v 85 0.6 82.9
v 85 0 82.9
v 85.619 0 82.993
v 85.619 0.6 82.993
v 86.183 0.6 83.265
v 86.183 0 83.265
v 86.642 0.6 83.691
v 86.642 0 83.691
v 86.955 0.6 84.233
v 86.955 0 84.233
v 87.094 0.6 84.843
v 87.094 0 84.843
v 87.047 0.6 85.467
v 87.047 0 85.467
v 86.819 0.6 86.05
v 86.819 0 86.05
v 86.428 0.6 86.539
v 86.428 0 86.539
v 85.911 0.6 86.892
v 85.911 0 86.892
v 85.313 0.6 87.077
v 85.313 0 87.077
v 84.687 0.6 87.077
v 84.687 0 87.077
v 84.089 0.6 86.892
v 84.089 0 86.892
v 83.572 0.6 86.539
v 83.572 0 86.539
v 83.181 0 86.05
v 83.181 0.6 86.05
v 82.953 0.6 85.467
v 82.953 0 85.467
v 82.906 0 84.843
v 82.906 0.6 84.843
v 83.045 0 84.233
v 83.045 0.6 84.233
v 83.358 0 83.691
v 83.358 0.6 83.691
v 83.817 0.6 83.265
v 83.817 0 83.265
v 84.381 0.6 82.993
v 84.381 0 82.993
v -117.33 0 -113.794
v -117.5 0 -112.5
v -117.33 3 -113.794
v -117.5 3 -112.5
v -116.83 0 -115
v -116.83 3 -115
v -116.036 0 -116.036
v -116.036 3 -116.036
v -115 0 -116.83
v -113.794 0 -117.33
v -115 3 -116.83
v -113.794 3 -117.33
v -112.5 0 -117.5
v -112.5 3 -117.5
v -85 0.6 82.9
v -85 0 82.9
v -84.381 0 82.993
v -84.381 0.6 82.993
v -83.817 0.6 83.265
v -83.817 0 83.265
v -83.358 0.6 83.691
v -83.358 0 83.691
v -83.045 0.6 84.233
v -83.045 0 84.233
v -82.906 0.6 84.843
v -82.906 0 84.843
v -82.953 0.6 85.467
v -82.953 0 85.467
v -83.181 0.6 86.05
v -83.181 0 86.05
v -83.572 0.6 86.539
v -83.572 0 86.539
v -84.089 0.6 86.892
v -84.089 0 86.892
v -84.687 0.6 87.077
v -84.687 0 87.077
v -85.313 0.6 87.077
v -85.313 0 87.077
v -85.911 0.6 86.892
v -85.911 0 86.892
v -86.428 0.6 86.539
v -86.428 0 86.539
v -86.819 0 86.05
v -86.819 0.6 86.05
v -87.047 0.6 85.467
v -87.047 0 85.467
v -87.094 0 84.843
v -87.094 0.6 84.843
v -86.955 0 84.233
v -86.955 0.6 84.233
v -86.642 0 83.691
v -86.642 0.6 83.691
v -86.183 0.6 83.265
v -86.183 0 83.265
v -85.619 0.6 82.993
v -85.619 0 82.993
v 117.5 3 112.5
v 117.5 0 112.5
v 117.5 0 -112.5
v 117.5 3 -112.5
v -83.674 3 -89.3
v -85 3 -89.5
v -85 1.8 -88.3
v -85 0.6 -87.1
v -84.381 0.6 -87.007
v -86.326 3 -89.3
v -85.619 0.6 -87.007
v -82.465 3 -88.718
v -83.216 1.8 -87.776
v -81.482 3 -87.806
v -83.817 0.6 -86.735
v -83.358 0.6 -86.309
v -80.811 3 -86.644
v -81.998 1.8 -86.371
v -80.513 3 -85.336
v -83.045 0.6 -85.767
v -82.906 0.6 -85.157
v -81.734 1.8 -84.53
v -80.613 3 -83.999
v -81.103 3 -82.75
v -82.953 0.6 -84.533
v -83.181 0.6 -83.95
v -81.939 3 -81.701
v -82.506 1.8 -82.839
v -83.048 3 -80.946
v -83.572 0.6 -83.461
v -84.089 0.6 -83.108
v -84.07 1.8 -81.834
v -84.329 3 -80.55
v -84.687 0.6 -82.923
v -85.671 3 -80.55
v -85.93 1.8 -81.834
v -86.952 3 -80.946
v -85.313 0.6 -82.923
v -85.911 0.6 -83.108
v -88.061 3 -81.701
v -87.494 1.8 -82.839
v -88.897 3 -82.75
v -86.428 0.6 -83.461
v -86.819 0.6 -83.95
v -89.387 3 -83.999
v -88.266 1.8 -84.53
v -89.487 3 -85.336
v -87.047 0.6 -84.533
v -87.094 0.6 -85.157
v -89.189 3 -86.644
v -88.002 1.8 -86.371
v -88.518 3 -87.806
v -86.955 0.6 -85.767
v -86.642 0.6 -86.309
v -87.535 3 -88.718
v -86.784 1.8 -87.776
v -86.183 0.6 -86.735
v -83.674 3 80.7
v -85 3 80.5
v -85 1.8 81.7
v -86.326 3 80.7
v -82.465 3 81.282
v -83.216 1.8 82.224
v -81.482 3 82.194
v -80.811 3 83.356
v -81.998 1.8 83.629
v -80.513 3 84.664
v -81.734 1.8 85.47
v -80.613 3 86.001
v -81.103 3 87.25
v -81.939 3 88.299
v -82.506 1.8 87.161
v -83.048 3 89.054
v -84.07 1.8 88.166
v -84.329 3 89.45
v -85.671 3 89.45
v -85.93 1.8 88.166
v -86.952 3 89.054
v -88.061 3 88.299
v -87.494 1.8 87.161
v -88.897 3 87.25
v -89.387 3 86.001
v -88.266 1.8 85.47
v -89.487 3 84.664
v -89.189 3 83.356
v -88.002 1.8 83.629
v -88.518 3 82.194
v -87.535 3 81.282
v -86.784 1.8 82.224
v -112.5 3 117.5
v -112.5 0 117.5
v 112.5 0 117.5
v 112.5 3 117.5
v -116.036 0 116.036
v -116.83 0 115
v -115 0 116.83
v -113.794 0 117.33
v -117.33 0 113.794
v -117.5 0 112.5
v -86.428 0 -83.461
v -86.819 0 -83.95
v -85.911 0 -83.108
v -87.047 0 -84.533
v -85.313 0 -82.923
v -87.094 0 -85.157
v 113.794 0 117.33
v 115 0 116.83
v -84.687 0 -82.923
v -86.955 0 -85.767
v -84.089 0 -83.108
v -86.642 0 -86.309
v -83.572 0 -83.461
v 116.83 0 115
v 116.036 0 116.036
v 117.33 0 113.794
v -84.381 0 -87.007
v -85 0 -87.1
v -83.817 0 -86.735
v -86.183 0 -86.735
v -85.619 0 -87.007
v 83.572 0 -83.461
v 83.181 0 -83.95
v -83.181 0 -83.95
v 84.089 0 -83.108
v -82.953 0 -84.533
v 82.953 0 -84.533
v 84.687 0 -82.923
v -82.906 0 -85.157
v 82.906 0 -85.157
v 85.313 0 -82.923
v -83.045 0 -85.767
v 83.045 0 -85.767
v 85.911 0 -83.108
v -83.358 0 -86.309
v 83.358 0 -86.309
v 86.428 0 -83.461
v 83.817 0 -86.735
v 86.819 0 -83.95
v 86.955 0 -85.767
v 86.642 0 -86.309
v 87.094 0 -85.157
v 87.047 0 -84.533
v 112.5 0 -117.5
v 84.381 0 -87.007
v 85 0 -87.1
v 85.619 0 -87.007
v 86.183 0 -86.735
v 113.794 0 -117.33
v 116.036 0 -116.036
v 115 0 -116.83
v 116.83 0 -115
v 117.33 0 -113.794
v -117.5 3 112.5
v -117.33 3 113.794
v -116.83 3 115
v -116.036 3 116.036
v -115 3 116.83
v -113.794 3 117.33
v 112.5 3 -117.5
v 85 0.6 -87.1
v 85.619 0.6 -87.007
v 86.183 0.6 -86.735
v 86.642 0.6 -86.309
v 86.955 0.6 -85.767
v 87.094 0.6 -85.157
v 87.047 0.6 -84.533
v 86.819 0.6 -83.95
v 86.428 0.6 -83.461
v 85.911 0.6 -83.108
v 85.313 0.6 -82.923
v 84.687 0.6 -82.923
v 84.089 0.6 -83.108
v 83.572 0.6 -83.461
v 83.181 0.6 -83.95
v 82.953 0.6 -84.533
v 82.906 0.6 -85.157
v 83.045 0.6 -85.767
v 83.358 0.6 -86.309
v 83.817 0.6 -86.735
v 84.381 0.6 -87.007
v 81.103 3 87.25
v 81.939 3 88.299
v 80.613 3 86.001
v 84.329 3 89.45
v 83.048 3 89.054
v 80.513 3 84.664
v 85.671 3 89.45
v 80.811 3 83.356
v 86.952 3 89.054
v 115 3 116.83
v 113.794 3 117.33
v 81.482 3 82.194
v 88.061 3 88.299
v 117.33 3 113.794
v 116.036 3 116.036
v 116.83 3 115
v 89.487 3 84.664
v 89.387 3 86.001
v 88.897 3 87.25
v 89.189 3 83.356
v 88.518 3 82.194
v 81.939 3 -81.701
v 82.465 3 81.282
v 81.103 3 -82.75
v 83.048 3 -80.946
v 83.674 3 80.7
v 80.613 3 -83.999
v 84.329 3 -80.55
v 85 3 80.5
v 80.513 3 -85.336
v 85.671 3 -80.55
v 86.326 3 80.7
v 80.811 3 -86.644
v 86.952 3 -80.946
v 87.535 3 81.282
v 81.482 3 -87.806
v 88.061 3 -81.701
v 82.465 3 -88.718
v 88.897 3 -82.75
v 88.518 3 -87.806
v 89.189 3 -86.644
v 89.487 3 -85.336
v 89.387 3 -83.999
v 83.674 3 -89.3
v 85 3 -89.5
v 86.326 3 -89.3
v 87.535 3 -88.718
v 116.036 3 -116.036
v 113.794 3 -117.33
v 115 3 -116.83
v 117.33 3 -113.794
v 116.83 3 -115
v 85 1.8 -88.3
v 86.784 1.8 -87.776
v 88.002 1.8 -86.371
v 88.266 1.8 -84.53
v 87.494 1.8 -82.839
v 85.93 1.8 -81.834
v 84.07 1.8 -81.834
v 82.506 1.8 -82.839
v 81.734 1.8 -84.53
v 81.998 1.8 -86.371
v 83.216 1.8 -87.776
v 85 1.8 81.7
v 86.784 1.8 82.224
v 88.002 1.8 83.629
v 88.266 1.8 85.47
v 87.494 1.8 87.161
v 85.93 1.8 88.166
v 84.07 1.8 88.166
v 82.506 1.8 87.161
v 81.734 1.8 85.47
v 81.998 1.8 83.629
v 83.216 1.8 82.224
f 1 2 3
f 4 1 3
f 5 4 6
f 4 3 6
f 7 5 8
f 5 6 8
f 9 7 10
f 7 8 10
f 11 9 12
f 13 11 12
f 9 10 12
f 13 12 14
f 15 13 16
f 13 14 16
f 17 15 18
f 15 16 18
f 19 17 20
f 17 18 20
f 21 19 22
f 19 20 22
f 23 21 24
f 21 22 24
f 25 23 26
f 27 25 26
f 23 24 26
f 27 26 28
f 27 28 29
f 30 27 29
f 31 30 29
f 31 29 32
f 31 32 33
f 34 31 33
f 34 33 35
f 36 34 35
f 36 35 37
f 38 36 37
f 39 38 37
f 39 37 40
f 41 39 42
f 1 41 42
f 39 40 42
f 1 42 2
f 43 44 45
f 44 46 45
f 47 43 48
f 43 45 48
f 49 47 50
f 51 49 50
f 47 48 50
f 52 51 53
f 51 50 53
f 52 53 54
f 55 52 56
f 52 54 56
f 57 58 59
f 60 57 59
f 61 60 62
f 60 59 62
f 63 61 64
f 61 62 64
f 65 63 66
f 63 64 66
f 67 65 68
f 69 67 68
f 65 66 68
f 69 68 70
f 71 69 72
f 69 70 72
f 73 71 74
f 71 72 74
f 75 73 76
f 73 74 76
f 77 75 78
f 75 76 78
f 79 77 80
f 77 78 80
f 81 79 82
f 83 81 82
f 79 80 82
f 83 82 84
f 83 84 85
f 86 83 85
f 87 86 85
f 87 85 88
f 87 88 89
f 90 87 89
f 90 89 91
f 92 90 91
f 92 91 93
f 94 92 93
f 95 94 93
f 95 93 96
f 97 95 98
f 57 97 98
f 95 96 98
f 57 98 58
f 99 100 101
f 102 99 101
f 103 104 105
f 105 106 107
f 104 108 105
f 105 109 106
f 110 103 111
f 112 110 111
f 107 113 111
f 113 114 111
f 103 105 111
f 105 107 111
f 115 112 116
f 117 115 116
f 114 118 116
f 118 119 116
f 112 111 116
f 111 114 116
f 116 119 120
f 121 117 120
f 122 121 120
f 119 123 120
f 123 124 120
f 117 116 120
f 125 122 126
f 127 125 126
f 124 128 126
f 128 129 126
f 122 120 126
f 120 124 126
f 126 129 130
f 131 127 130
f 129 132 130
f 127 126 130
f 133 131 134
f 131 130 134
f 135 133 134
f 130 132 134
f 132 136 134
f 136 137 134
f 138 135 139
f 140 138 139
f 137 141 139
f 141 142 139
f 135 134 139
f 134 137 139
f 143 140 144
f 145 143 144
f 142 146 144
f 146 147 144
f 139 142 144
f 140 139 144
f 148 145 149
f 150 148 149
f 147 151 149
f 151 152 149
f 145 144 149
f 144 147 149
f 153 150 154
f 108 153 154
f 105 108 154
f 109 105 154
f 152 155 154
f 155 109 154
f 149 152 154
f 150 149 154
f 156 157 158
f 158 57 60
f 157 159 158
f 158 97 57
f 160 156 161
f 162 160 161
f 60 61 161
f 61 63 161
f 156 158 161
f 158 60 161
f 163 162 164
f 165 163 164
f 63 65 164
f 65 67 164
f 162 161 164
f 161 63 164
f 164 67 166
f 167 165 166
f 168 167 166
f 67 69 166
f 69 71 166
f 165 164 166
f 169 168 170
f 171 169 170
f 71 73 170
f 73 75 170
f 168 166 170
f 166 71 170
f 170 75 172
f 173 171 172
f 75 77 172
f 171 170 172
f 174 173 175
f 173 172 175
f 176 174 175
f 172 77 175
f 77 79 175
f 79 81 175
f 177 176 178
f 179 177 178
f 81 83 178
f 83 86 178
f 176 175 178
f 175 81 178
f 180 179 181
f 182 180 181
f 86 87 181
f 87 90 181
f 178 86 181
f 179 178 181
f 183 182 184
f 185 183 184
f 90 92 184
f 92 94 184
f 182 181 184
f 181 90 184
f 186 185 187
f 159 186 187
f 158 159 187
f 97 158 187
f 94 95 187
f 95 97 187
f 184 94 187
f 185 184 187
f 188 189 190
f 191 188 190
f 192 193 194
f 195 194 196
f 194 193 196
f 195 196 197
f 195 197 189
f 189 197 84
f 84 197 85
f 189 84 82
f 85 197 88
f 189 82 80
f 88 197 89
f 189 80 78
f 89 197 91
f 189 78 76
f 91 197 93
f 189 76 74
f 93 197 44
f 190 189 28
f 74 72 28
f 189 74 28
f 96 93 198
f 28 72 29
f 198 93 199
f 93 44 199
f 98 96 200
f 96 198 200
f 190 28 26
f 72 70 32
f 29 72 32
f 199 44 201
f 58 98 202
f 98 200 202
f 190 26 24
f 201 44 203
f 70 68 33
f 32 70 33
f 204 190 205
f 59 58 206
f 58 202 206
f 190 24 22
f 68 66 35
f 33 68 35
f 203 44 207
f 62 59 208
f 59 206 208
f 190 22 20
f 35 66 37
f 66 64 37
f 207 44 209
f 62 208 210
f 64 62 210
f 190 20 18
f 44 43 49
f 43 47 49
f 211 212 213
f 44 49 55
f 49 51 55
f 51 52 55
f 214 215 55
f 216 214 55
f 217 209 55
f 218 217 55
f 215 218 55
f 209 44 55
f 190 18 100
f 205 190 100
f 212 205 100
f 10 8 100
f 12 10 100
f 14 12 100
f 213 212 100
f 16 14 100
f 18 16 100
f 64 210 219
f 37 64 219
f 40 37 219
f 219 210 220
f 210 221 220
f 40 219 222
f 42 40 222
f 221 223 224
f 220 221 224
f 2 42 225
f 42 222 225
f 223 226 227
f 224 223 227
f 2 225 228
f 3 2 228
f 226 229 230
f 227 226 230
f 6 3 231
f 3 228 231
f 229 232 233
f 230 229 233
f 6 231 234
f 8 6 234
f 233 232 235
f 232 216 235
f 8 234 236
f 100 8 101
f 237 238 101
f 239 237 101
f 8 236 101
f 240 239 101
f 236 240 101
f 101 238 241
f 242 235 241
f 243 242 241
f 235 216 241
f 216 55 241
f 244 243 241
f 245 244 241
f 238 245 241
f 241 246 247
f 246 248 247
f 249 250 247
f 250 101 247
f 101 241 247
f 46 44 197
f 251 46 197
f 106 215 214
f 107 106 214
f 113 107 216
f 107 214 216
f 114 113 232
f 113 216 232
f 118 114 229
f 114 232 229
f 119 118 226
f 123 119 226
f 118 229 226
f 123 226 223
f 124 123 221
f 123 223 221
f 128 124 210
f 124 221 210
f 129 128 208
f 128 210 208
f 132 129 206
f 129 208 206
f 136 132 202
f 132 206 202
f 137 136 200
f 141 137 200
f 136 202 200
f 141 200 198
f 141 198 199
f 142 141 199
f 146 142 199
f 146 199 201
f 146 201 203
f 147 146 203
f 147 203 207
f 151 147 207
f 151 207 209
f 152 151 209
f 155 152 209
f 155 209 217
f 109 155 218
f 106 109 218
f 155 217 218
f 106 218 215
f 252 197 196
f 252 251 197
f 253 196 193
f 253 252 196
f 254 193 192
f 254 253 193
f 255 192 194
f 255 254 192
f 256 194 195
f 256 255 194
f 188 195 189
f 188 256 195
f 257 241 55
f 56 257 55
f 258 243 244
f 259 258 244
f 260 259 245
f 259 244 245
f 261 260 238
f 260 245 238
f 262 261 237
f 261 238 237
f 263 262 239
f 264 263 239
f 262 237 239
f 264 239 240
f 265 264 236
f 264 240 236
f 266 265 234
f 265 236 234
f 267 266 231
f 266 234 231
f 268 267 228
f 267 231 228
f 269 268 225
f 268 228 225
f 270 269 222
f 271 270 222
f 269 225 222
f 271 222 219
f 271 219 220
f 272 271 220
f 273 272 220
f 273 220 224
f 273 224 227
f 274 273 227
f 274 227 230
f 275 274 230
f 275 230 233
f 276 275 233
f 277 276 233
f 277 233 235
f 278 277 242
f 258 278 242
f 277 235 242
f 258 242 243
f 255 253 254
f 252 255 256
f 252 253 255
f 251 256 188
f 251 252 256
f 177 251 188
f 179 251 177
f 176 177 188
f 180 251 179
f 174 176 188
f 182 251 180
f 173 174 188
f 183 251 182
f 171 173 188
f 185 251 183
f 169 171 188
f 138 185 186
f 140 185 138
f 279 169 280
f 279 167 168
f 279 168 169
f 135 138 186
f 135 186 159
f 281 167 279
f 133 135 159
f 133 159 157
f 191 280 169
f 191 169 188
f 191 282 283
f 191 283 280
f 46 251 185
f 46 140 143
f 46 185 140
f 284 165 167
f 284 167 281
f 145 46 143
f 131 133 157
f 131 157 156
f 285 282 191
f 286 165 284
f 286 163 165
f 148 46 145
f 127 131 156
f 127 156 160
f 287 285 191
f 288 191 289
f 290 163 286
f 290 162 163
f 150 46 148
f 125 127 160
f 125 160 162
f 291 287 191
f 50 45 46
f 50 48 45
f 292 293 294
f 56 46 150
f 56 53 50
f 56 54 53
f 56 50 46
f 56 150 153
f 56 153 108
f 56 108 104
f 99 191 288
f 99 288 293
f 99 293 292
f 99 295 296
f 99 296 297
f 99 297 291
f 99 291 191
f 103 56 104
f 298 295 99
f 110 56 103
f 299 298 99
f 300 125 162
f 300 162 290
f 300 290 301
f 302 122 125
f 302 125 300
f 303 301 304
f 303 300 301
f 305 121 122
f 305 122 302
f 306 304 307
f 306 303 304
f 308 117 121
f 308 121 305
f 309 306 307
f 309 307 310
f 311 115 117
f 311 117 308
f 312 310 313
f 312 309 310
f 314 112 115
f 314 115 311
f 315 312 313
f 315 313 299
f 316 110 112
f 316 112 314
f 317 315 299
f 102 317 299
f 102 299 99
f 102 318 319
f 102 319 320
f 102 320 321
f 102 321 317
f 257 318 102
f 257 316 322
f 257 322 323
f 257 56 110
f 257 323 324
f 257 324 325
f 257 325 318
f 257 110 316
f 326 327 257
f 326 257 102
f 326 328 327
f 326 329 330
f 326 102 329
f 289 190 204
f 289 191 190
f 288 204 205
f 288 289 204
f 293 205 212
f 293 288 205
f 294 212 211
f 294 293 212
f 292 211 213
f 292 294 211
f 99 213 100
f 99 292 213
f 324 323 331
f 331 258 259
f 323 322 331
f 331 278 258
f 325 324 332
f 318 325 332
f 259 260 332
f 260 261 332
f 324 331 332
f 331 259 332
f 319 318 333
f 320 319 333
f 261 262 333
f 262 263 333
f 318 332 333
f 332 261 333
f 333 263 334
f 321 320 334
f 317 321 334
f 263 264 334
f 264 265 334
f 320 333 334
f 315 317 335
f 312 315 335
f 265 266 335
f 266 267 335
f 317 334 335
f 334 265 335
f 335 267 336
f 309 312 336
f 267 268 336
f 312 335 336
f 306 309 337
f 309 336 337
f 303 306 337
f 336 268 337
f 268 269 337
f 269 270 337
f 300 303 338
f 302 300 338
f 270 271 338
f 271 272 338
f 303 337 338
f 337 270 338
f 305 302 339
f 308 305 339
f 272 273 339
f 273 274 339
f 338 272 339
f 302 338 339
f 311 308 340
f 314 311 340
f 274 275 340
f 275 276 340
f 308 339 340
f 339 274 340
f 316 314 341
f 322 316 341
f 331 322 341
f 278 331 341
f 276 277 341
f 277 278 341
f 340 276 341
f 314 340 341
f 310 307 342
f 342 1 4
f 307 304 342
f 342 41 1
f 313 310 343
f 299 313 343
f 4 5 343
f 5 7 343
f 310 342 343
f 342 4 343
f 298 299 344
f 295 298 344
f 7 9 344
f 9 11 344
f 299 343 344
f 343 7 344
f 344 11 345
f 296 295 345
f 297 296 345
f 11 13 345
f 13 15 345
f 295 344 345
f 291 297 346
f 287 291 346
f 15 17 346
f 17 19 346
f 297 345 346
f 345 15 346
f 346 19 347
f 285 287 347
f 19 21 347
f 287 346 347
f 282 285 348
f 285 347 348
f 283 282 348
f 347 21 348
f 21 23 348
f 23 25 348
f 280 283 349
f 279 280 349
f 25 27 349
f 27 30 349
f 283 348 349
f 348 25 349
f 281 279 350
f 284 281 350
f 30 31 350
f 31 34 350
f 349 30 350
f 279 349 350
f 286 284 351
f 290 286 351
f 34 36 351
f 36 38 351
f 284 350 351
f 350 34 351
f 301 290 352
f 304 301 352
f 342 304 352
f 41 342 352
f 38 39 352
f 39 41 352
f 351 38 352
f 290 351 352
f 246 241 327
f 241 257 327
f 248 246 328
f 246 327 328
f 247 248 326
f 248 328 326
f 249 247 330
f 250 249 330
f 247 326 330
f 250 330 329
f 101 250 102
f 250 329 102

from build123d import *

# Parameters (mm, degrees)
BOSS_EXTRUDE1_DEPTH = 3
SKETCH2_R           = 2.1
CUT_EXTRUDE1_DEPTH  = 3
FILLET1_R           = 5
CHAMFER1_SIZE       = 2.4


with BuildPart() as part:
    # Sketch1 → Boss-Extrude1 (new body)
    with BuildSketch(Plane(origin=(0, 0, 0), x_dir=(1, 0, 0), z_dir=(0, 1, 0))):
        Polygon((0, 0), (-117.5, 117.5), (-117.5, -67.83865663), align=None)
        Polygon((0, 117.5), (-117.5, 117.5), (0, 0), align=None)
        Polygon((0, 117.5), (0, 0), (117.5, -67.83865663), (117.5, 117.5), align=None)
        Polygon((117.5, -67.83865663), (0, 0), (117.5, -117.5), align=None)
        Polygon((117.5, -117.5), (0, 0), (-117.5, -67.83865663), (-117.5, -117.5), align=None)
    extrude(amount=BOSS_EXTRUDE1_DEPTH)

    # Sketch2 → Cut-Extrude1 (cut)
    with BuildSketch(Plane.XZ):
        with Locations(Location((85, -85, 0), (0, 0, 270))):
            Circle(SKETCH2_R)
        with Locations(Location((-85, 85, 0), (0, 0, 270))):
            Circle(SKETCH2_R)
        with Locations(Location((85, 85, 0), (0, 0, 270))):
            Circle(SKETCH2_R)
        with Locations(Location((-85, -85, 0), (0, 0, 270))):
            Circle(SKETCH2_R)
    extrude(amount=-CUT_EXTRUDE1_DEPTH, mode=Mode.SUBTRACT)

    # Fillet1
    fillet1_edges = [part.edges().sort_by_distance(p)[0] for p in [
        (-117.5, 1.5, 117.5),
        (-117.5, 1.5, -117.5),
        (117.5, 1.5, -117.5),
        (117.5, 1.5, 117.5),
    ]]
    fillet(fillet1_edges, radius=FILLET1_R)

    # Chamfer1
    chamfer1_edges = [part.edges().sort_by_distance(p)[0] for p in [
        (-85, 3, -82.9),
        (85, 3, 87.1),
        (-85, 3, 87.1),
        (85, 3, -82.9),
    ]]
    chamfer(chamfer1_edges, length=CHAMFER1_SIZE)


solid = part.part
